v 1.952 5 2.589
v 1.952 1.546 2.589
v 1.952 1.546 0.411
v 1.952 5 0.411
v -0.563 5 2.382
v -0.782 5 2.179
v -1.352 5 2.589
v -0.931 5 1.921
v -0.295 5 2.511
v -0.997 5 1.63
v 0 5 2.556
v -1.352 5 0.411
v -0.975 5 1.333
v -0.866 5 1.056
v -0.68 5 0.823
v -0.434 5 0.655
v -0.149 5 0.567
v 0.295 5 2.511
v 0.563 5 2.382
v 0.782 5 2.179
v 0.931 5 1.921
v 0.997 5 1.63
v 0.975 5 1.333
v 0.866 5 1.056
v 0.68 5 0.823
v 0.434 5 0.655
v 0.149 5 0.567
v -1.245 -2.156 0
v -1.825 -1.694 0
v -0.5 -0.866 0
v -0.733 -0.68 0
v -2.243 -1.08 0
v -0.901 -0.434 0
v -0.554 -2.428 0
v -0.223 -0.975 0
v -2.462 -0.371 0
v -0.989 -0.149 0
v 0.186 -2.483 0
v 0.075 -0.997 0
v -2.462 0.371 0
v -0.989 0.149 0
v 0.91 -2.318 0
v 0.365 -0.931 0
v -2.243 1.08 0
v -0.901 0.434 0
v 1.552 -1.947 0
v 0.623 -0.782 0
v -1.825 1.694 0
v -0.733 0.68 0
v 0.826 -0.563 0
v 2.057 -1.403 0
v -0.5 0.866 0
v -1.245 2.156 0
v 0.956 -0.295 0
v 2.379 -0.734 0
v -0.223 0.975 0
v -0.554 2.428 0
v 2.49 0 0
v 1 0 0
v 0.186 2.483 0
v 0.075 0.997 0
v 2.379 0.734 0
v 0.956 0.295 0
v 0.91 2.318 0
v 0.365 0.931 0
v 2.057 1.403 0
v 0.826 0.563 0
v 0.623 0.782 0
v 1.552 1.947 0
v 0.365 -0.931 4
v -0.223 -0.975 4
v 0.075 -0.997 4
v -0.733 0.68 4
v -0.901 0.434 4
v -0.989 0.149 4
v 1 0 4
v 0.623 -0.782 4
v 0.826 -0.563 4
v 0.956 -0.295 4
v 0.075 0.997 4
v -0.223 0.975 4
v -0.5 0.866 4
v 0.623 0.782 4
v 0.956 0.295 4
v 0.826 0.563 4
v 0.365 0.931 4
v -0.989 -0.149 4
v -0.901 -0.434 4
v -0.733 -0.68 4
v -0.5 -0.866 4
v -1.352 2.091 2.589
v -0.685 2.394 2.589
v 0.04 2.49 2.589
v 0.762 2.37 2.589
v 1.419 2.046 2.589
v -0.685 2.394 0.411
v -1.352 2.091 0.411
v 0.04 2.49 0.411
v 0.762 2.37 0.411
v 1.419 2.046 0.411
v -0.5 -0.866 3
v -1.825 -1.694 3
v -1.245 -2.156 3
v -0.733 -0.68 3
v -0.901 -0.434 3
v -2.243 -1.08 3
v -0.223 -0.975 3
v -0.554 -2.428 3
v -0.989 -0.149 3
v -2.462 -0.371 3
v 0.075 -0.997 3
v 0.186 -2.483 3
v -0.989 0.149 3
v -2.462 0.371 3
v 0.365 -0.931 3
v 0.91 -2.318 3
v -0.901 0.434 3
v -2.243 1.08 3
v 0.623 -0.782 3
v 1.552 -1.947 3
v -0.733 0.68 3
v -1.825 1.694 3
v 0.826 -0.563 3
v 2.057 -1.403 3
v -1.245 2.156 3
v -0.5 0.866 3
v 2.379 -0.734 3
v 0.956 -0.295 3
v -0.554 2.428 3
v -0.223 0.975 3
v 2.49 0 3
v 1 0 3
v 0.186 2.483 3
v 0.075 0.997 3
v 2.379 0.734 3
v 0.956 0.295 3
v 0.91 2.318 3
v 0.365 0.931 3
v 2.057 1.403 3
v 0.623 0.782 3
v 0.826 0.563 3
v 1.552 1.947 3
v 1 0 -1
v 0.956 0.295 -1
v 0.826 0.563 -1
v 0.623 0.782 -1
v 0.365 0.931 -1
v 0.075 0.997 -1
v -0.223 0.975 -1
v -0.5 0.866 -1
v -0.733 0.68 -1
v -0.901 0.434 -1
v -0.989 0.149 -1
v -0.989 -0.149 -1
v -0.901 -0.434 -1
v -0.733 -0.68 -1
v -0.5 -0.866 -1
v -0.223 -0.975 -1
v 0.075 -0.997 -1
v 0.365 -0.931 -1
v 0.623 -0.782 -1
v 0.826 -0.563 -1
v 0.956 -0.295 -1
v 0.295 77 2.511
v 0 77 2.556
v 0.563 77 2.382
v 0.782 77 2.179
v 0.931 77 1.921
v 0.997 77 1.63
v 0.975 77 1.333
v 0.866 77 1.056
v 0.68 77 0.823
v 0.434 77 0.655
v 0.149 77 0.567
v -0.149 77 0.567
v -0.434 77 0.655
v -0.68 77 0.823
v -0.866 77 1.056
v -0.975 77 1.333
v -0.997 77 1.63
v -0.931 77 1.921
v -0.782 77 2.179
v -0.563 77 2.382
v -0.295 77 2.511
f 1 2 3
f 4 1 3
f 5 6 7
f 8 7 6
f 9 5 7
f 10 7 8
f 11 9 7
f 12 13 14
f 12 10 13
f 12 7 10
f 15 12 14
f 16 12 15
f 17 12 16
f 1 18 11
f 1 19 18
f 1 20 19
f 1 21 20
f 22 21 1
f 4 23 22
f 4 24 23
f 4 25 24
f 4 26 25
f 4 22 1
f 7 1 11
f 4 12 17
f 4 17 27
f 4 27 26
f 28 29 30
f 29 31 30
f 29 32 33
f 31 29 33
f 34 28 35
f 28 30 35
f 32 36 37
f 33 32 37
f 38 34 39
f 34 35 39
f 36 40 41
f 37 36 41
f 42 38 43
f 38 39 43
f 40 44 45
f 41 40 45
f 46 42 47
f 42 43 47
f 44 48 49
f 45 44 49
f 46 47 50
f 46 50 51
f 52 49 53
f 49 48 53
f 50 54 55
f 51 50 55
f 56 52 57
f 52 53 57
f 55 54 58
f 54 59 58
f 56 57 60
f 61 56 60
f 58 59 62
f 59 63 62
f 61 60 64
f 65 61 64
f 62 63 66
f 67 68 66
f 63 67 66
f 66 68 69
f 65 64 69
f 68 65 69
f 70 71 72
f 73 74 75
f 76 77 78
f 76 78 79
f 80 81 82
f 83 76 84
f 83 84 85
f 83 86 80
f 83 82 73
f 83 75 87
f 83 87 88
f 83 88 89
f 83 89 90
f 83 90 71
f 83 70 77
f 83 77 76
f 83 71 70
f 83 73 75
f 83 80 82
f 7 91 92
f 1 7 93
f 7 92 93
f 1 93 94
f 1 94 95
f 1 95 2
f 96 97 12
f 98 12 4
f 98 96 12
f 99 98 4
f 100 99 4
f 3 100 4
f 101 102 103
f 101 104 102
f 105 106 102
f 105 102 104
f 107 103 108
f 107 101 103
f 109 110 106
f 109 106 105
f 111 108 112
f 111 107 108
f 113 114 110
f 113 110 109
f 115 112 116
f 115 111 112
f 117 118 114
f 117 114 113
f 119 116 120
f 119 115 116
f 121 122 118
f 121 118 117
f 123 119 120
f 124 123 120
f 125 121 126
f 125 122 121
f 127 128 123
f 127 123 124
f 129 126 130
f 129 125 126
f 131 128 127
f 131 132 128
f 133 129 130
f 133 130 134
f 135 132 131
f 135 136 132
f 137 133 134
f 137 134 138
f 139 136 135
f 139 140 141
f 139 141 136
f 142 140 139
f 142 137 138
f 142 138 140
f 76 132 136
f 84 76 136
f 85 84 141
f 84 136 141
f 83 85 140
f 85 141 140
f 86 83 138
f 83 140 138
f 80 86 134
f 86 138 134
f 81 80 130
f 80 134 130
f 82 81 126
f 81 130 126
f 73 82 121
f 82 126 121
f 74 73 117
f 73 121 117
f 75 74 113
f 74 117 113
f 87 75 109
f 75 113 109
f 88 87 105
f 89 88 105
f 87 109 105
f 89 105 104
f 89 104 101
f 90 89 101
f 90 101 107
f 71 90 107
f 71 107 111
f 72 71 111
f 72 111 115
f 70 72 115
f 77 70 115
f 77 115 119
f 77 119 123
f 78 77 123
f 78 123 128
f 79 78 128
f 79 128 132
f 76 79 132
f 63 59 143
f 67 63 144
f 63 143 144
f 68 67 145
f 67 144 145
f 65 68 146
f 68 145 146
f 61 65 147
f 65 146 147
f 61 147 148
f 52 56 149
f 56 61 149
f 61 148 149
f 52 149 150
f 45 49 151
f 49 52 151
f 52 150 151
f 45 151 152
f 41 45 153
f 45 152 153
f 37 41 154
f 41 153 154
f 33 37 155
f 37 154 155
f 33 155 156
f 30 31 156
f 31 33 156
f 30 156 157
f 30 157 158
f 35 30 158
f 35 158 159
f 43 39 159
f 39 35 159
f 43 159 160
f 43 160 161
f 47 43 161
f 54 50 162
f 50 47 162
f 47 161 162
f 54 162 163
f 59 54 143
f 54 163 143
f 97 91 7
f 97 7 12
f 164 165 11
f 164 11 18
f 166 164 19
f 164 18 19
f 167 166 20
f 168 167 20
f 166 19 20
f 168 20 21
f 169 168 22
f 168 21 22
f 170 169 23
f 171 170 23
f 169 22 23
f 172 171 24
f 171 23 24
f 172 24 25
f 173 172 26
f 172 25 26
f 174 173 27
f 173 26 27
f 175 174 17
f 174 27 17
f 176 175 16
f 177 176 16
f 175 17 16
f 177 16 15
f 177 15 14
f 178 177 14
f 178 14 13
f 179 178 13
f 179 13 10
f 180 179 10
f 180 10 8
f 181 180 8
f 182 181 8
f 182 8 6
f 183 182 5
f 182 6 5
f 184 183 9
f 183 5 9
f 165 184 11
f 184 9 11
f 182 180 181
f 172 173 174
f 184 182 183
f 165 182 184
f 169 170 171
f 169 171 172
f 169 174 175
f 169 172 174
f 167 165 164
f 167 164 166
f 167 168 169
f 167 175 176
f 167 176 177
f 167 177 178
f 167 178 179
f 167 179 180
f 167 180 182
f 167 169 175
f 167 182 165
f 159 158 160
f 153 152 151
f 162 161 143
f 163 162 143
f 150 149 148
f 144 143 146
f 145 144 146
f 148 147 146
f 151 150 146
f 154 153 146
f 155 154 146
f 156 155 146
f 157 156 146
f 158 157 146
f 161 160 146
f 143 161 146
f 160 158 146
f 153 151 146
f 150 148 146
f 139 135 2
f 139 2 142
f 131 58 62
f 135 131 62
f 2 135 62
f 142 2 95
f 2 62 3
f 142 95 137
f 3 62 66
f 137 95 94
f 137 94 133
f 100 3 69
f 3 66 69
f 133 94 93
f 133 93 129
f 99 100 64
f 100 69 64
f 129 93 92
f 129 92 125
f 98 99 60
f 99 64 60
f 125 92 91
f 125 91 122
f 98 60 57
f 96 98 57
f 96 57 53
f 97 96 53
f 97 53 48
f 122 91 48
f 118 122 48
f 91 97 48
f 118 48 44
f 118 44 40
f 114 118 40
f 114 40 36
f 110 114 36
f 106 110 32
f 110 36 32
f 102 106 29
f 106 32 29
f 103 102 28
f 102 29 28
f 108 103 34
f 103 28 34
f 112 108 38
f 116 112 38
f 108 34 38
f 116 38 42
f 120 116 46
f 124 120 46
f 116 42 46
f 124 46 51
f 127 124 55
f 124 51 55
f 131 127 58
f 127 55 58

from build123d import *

# Parameters (mm, degrees)
SKETCH1_R                = 2.49
BOSS_EXTRUDE1_DEPTH      = 3
BOSS_EXTRUDE2_DEPTH      = 1
BOSS_EXTRUDE2_DEPTH_BACK = 4
SKETCH2_R                = 1
SKETCH3_W                = 3.303783413
SKETCH3_H                = 2.177091536
BOSS_EXTRUDE3_DEPTH      = 5
SKETCH4_R                = 1
BOSS_EXTRUDE4_DEPTH      = 72


with BuildPart() as part:
    # Sketch1 → Boss-Extrude1 (new body)
    with BuildSketch(Plane.XY):
        Circle(SKETCH1_R)
    extrude(amount=BOSS_EXTRUDE1_DEPTH)

    # Sketch2 → Boss-Extrude2 (add, two sides: drawn at the far end of the back side and taken through both)
    with BuildSketch(Plane.XY.offset(3).offset(-BOSS_EXTRUDE2_DEPTH_BACK)):
        Circle(SKETCH2_R)
    extrude(amount=BOSS_EXTRUDE2_DEPTH + BOSS_EXTRUDE2_DEPTH_BACK)

    # Sketch3 → Boss-Extrude3 (add)
    with BuildSketch(Plane(origin=(0, 0, 0), x_dir=(1, 0, 0), z_dir=(0, 1, 0))):
        with Locations((0.300293678, -1.5)):
            Rectangle(SKETCH3_W, SKETCH3_H)
    extrude(amount=BOSS_EXTRUDE3_DEPTH)

    # Sketch4 → Boss-Extrude4 (add)
    with BuildSketch(Plane(origin=(0, 5, 0), x_dir=(1, 0, 0), z_dir=(0, 1, 0))):
        with Locations(Location((0, -1.555640041, 0), (0, 0, 270))):
            Circle(SKETCH4_R)
    extrude(amount=BOSS_EXTRUDE4_DEPTH)


solid = part.part
